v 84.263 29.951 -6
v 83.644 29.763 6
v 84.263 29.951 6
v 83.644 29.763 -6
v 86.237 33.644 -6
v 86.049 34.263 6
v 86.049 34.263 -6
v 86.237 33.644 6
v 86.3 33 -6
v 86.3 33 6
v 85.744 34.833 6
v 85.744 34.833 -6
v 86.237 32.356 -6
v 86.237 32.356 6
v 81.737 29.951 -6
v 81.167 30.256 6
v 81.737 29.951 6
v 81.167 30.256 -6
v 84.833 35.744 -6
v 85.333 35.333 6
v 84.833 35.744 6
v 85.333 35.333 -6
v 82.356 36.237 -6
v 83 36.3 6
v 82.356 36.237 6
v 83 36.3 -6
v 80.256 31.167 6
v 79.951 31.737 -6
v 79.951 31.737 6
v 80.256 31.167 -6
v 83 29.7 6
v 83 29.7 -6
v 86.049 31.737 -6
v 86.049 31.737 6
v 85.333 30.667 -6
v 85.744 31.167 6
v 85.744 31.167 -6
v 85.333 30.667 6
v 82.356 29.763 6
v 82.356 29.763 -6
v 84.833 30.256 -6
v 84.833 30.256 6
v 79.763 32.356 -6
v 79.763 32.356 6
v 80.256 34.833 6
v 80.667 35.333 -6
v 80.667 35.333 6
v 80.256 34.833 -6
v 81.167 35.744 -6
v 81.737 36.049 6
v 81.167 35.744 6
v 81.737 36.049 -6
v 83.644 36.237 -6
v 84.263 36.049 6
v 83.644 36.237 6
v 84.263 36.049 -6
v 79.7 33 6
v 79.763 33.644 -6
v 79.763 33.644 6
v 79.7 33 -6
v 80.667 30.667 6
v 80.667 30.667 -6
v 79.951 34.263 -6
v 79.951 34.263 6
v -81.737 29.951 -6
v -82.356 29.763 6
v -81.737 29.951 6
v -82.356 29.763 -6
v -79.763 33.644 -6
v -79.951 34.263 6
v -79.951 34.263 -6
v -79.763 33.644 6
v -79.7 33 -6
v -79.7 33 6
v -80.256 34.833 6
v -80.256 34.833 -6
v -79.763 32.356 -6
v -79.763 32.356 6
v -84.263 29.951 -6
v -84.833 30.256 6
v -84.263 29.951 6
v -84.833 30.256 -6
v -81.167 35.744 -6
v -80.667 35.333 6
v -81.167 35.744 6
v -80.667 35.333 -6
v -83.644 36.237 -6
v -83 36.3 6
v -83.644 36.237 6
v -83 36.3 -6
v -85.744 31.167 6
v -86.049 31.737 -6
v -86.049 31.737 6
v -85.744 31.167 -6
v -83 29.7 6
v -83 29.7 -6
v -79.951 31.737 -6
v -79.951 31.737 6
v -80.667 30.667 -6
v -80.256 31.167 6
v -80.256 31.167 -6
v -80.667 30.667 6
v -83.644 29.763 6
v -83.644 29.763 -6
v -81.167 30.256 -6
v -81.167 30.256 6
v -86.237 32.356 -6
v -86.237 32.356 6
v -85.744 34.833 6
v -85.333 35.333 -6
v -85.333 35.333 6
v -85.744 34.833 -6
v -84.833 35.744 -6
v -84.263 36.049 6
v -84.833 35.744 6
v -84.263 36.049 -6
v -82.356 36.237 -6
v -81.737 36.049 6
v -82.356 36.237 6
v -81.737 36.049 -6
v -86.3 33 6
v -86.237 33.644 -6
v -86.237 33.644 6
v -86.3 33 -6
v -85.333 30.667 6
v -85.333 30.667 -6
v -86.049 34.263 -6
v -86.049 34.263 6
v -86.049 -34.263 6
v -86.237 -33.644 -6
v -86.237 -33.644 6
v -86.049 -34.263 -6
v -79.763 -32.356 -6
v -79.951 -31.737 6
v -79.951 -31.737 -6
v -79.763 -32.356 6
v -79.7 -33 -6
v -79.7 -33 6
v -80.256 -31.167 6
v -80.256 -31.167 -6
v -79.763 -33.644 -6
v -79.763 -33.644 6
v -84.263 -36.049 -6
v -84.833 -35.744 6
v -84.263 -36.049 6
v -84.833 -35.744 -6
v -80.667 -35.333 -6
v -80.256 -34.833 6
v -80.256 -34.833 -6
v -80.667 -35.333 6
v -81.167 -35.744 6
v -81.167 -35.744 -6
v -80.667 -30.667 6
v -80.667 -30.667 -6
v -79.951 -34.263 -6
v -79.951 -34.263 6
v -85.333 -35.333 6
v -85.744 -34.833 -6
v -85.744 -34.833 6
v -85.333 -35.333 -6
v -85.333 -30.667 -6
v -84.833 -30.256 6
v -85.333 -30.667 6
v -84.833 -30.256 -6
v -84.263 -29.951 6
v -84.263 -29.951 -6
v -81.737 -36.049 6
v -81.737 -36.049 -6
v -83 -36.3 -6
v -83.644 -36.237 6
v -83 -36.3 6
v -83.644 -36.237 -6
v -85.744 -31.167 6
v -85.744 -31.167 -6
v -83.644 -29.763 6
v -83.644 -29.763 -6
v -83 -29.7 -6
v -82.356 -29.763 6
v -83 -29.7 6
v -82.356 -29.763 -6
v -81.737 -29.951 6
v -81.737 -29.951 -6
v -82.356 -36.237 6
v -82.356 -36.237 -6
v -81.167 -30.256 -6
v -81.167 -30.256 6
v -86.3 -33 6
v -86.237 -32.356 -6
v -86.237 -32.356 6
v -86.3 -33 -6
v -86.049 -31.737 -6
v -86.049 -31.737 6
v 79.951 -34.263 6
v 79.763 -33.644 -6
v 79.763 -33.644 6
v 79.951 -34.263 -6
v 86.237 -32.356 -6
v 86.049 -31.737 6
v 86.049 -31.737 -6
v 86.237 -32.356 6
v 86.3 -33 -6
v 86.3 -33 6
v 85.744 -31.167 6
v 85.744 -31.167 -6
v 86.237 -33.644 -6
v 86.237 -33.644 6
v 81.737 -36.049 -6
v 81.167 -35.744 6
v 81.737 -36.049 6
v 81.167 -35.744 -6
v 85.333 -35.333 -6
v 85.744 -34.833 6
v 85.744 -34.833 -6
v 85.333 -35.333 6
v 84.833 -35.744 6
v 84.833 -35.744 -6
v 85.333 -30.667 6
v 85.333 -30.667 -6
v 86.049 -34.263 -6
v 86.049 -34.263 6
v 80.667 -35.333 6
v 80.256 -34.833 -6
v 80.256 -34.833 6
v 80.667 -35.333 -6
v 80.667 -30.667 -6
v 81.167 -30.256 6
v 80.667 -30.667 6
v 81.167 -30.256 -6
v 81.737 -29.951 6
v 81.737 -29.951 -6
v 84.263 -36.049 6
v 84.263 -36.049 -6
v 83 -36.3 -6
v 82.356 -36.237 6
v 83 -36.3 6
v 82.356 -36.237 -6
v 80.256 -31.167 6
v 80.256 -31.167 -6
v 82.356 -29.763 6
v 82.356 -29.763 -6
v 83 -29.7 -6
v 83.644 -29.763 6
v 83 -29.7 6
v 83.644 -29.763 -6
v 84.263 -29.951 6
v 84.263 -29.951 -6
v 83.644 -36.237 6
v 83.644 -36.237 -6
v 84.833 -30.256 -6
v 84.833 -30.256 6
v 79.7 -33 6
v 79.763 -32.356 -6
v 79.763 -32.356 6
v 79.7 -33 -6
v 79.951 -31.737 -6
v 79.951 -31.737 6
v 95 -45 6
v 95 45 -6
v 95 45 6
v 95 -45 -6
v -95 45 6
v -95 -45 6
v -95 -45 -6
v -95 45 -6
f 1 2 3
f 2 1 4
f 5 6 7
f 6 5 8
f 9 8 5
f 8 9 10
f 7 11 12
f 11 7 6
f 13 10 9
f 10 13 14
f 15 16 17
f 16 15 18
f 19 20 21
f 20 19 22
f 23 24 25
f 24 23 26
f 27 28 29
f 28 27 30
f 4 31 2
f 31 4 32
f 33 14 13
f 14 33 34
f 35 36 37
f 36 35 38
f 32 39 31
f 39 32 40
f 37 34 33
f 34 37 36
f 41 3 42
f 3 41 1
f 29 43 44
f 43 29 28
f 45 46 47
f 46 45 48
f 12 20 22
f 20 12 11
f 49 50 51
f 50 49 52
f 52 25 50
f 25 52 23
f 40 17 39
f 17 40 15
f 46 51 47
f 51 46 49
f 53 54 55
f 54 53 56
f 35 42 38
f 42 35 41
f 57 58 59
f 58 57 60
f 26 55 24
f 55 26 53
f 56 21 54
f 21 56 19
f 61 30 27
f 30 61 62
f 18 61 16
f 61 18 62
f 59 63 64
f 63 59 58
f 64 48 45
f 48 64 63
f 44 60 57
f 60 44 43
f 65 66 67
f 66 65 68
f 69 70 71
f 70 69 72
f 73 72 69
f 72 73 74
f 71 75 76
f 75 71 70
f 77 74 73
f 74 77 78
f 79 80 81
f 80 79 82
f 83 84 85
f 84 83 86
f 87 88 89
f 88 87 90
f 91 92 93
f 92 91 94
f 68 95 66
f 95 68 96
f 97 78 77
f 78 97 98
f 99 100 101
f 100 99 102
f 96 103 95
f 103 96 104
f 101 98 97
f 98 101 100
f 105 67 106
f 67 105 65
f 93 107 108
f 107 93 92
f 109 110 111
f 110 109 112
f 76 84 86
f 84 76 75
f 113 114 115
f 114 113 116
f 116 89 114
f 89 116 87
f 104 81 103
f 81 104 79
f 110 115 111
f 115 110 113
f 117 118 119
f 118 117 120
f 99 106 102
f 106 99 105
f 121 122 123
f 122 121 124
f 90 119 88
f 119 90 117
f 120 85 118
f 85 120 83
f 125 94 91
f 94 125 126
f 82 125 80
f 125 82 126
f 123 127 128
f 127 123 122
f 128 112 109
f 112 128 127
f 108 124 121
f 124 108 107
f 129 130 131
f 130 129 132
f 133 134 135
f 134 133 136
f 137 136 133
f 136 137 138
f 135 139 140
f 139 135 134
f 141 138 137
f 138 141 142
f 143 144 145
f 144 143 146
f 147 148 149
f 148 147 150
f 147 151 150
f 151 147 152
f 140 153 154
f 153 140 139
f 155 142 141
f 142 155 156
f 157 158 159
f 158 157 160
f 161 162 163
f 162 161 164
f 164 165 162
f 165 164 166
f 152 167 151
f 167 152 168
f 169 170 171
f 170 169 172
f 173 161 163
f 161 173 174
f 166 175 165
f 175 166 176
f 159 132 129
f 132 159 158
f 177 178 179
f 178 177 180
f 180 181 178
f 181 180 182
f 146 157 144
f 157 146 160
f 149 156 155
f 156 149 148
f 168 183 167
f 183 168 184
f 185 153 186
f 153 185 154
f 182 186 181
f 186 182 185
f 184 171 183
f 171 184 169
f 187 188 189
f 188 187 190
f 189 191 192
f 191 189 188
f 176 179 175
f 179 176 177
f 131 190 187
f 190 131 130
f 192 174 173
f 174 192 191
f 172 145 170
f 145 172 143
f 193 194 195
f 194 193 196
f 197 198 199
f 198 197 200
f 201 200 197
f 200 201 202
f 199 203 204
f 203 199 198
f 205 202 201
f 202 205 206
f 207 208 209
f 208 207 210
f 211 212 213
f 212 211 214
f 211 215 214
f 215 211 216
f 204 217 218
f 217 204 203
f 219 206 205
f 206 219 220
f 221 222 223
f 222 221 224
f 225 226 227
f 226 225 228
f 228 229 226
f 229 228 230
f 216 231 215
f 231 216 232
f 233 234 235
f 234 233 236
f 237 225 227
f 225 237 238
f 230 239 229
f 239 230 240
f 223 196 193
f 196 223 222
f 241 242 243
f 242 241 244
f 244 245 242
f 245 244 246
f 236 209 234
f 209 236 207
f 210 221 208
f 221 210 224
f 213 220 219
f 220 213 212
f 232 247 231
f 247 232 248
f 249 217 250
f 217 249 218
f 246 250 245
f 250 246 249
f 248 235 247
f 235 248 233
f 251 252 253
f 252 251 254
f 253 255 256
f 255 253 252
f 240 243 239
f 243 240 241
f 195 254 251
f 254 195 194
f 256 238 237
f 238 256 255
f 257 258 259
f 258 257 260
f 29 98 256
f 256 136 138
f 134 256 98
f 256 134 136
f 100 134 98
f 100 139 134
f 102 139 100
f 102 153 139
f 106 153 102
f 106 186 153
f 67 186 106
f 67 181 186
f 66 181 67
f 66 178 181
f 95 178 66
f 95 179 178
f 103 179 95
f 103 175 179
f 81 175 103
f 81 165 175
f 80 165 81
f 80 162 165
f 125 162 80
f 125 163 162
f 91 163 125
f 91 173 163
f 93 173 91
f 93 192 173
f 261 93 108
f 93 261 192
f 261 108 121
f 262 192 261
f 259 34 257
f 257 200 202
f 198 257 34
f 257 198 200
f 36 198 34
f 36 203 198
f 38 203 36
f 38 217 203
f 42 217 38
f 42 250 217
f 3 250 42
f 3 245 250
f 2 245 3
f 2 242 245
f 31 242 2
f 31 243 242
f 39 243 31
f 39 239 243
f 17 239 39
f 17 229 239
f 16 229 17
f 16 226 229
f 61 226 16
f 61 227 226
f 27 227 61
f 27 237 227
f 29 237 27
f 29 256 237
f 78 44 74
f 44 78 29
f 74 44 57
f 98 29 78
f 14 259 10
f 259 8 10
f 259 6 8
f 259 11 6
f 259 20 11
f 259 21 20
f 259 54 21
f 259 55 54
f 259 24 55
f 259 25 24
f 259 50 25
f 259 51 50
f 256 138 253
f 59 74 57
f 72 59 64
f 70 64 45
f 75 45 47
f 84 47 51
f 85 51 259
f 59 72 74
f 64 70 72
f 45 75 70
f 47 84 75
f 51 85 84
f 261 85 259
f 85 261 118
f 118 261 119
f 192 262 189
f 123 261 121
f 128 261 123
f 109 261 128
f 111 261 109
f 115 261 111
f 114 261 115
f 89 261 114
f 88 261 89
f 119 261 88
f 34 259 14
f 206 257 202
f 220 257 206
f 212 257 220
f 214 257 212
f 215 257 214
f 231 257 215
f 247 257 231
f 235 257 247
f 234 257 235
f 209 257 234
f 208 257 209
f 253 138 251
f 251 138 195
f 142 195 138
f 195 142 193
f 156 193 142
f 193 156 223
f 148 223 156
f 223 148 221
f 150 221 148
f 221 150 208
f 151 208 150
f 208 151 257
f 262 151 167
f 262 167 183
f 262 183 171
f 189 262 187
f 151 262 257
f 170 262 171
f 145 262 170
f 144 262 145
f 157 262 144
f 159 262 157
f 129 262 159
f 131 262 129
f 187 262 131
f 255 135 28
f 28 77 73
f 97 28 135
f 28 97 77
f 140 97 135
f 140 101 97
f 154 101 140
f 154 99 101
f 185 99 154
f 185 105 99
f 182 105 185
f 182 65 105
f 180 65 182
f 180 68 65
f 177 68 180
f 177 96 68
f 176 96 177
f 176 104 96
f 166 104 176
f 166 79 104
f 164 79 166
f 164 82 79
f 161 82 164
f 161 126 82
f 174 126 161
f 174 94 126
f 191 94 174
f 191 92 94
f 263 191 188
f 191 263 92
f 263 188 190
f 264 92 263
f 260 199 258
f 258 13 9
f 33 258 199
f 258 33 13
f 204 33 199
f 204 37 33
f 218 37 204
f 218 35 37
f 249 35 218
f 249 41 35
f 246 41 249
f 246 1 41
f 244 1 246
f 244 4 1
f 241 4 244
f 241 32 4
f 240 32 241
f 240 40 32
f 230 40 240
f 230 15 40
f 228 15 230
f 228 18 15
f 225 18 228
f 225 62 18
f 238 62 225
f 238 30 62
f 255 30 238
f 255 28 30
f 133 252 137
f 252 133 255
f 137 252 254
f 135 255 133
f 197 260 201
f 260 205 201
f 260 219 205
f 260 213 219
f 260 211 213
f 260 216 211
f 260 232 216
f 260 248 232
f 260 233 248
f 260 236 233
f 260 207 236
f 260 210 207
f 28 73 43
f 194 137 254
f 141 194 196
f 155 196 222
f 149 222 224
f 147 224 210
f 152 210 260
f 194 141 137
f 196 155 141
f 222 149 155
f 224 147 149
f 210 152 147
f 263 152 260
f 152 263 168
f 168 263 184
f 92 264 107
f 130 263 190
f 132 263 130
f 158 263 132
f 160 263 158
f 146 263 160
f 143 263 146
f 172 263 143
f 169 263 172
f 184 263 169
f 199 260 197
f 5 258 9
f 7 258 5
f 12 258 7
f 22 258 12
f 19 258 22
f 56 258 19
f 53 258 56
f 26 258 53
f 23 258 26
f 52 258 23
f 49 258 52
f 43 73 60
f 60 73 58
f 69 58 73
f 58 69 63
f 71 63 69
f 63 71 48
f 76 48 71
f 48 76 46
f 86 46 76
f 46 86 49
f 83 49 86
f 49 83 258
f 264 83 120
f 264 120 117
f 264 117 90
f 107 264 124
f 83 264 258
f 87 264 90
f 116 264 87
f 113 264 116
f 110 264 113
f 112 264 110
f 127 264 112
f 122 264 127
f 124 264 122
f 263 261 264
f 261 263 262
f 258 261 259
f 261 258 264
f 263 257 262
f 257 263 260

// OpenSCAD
$fn = 32;

// ----------------------------------------------------------------------
// Corner plate 190 x 90 x 12
// 4 holes, centres taken from the edge offset
// ----------------------------------------------------------------------

// --- parameters (mm) ---
plate = [190, 90, 12];  // overall size (x, y, z)
holes = 4;              // number of holes the drawing asks for
hole_d = 6.6;           // hole diameter
edge = 12;              // hole centre offset from the plate edge

// --- derived feature positions (mm) ---
corner_x = plate[0] / 2 - edge;  // = 83   corner hole X
corner_y = plate[1] / 2 - edge;  // = 33   corner hole Y
feature_centers = [
  [corner_x, corner_y],
  [-corner_x, corner_y],
  [-corner_x, -corner_y],
  [corner_x, -corner_y]
];   // hole centres the loop below drills

// plate outline, every hole drilled through with the same cutters
difference() {
  cube(plate, center = true);
  for (centre = feature_centers)
    translate([centre[0], centre[1], 0])
      cylinder(d = hole_d, h = plate[2] + 2, center = true);
}
